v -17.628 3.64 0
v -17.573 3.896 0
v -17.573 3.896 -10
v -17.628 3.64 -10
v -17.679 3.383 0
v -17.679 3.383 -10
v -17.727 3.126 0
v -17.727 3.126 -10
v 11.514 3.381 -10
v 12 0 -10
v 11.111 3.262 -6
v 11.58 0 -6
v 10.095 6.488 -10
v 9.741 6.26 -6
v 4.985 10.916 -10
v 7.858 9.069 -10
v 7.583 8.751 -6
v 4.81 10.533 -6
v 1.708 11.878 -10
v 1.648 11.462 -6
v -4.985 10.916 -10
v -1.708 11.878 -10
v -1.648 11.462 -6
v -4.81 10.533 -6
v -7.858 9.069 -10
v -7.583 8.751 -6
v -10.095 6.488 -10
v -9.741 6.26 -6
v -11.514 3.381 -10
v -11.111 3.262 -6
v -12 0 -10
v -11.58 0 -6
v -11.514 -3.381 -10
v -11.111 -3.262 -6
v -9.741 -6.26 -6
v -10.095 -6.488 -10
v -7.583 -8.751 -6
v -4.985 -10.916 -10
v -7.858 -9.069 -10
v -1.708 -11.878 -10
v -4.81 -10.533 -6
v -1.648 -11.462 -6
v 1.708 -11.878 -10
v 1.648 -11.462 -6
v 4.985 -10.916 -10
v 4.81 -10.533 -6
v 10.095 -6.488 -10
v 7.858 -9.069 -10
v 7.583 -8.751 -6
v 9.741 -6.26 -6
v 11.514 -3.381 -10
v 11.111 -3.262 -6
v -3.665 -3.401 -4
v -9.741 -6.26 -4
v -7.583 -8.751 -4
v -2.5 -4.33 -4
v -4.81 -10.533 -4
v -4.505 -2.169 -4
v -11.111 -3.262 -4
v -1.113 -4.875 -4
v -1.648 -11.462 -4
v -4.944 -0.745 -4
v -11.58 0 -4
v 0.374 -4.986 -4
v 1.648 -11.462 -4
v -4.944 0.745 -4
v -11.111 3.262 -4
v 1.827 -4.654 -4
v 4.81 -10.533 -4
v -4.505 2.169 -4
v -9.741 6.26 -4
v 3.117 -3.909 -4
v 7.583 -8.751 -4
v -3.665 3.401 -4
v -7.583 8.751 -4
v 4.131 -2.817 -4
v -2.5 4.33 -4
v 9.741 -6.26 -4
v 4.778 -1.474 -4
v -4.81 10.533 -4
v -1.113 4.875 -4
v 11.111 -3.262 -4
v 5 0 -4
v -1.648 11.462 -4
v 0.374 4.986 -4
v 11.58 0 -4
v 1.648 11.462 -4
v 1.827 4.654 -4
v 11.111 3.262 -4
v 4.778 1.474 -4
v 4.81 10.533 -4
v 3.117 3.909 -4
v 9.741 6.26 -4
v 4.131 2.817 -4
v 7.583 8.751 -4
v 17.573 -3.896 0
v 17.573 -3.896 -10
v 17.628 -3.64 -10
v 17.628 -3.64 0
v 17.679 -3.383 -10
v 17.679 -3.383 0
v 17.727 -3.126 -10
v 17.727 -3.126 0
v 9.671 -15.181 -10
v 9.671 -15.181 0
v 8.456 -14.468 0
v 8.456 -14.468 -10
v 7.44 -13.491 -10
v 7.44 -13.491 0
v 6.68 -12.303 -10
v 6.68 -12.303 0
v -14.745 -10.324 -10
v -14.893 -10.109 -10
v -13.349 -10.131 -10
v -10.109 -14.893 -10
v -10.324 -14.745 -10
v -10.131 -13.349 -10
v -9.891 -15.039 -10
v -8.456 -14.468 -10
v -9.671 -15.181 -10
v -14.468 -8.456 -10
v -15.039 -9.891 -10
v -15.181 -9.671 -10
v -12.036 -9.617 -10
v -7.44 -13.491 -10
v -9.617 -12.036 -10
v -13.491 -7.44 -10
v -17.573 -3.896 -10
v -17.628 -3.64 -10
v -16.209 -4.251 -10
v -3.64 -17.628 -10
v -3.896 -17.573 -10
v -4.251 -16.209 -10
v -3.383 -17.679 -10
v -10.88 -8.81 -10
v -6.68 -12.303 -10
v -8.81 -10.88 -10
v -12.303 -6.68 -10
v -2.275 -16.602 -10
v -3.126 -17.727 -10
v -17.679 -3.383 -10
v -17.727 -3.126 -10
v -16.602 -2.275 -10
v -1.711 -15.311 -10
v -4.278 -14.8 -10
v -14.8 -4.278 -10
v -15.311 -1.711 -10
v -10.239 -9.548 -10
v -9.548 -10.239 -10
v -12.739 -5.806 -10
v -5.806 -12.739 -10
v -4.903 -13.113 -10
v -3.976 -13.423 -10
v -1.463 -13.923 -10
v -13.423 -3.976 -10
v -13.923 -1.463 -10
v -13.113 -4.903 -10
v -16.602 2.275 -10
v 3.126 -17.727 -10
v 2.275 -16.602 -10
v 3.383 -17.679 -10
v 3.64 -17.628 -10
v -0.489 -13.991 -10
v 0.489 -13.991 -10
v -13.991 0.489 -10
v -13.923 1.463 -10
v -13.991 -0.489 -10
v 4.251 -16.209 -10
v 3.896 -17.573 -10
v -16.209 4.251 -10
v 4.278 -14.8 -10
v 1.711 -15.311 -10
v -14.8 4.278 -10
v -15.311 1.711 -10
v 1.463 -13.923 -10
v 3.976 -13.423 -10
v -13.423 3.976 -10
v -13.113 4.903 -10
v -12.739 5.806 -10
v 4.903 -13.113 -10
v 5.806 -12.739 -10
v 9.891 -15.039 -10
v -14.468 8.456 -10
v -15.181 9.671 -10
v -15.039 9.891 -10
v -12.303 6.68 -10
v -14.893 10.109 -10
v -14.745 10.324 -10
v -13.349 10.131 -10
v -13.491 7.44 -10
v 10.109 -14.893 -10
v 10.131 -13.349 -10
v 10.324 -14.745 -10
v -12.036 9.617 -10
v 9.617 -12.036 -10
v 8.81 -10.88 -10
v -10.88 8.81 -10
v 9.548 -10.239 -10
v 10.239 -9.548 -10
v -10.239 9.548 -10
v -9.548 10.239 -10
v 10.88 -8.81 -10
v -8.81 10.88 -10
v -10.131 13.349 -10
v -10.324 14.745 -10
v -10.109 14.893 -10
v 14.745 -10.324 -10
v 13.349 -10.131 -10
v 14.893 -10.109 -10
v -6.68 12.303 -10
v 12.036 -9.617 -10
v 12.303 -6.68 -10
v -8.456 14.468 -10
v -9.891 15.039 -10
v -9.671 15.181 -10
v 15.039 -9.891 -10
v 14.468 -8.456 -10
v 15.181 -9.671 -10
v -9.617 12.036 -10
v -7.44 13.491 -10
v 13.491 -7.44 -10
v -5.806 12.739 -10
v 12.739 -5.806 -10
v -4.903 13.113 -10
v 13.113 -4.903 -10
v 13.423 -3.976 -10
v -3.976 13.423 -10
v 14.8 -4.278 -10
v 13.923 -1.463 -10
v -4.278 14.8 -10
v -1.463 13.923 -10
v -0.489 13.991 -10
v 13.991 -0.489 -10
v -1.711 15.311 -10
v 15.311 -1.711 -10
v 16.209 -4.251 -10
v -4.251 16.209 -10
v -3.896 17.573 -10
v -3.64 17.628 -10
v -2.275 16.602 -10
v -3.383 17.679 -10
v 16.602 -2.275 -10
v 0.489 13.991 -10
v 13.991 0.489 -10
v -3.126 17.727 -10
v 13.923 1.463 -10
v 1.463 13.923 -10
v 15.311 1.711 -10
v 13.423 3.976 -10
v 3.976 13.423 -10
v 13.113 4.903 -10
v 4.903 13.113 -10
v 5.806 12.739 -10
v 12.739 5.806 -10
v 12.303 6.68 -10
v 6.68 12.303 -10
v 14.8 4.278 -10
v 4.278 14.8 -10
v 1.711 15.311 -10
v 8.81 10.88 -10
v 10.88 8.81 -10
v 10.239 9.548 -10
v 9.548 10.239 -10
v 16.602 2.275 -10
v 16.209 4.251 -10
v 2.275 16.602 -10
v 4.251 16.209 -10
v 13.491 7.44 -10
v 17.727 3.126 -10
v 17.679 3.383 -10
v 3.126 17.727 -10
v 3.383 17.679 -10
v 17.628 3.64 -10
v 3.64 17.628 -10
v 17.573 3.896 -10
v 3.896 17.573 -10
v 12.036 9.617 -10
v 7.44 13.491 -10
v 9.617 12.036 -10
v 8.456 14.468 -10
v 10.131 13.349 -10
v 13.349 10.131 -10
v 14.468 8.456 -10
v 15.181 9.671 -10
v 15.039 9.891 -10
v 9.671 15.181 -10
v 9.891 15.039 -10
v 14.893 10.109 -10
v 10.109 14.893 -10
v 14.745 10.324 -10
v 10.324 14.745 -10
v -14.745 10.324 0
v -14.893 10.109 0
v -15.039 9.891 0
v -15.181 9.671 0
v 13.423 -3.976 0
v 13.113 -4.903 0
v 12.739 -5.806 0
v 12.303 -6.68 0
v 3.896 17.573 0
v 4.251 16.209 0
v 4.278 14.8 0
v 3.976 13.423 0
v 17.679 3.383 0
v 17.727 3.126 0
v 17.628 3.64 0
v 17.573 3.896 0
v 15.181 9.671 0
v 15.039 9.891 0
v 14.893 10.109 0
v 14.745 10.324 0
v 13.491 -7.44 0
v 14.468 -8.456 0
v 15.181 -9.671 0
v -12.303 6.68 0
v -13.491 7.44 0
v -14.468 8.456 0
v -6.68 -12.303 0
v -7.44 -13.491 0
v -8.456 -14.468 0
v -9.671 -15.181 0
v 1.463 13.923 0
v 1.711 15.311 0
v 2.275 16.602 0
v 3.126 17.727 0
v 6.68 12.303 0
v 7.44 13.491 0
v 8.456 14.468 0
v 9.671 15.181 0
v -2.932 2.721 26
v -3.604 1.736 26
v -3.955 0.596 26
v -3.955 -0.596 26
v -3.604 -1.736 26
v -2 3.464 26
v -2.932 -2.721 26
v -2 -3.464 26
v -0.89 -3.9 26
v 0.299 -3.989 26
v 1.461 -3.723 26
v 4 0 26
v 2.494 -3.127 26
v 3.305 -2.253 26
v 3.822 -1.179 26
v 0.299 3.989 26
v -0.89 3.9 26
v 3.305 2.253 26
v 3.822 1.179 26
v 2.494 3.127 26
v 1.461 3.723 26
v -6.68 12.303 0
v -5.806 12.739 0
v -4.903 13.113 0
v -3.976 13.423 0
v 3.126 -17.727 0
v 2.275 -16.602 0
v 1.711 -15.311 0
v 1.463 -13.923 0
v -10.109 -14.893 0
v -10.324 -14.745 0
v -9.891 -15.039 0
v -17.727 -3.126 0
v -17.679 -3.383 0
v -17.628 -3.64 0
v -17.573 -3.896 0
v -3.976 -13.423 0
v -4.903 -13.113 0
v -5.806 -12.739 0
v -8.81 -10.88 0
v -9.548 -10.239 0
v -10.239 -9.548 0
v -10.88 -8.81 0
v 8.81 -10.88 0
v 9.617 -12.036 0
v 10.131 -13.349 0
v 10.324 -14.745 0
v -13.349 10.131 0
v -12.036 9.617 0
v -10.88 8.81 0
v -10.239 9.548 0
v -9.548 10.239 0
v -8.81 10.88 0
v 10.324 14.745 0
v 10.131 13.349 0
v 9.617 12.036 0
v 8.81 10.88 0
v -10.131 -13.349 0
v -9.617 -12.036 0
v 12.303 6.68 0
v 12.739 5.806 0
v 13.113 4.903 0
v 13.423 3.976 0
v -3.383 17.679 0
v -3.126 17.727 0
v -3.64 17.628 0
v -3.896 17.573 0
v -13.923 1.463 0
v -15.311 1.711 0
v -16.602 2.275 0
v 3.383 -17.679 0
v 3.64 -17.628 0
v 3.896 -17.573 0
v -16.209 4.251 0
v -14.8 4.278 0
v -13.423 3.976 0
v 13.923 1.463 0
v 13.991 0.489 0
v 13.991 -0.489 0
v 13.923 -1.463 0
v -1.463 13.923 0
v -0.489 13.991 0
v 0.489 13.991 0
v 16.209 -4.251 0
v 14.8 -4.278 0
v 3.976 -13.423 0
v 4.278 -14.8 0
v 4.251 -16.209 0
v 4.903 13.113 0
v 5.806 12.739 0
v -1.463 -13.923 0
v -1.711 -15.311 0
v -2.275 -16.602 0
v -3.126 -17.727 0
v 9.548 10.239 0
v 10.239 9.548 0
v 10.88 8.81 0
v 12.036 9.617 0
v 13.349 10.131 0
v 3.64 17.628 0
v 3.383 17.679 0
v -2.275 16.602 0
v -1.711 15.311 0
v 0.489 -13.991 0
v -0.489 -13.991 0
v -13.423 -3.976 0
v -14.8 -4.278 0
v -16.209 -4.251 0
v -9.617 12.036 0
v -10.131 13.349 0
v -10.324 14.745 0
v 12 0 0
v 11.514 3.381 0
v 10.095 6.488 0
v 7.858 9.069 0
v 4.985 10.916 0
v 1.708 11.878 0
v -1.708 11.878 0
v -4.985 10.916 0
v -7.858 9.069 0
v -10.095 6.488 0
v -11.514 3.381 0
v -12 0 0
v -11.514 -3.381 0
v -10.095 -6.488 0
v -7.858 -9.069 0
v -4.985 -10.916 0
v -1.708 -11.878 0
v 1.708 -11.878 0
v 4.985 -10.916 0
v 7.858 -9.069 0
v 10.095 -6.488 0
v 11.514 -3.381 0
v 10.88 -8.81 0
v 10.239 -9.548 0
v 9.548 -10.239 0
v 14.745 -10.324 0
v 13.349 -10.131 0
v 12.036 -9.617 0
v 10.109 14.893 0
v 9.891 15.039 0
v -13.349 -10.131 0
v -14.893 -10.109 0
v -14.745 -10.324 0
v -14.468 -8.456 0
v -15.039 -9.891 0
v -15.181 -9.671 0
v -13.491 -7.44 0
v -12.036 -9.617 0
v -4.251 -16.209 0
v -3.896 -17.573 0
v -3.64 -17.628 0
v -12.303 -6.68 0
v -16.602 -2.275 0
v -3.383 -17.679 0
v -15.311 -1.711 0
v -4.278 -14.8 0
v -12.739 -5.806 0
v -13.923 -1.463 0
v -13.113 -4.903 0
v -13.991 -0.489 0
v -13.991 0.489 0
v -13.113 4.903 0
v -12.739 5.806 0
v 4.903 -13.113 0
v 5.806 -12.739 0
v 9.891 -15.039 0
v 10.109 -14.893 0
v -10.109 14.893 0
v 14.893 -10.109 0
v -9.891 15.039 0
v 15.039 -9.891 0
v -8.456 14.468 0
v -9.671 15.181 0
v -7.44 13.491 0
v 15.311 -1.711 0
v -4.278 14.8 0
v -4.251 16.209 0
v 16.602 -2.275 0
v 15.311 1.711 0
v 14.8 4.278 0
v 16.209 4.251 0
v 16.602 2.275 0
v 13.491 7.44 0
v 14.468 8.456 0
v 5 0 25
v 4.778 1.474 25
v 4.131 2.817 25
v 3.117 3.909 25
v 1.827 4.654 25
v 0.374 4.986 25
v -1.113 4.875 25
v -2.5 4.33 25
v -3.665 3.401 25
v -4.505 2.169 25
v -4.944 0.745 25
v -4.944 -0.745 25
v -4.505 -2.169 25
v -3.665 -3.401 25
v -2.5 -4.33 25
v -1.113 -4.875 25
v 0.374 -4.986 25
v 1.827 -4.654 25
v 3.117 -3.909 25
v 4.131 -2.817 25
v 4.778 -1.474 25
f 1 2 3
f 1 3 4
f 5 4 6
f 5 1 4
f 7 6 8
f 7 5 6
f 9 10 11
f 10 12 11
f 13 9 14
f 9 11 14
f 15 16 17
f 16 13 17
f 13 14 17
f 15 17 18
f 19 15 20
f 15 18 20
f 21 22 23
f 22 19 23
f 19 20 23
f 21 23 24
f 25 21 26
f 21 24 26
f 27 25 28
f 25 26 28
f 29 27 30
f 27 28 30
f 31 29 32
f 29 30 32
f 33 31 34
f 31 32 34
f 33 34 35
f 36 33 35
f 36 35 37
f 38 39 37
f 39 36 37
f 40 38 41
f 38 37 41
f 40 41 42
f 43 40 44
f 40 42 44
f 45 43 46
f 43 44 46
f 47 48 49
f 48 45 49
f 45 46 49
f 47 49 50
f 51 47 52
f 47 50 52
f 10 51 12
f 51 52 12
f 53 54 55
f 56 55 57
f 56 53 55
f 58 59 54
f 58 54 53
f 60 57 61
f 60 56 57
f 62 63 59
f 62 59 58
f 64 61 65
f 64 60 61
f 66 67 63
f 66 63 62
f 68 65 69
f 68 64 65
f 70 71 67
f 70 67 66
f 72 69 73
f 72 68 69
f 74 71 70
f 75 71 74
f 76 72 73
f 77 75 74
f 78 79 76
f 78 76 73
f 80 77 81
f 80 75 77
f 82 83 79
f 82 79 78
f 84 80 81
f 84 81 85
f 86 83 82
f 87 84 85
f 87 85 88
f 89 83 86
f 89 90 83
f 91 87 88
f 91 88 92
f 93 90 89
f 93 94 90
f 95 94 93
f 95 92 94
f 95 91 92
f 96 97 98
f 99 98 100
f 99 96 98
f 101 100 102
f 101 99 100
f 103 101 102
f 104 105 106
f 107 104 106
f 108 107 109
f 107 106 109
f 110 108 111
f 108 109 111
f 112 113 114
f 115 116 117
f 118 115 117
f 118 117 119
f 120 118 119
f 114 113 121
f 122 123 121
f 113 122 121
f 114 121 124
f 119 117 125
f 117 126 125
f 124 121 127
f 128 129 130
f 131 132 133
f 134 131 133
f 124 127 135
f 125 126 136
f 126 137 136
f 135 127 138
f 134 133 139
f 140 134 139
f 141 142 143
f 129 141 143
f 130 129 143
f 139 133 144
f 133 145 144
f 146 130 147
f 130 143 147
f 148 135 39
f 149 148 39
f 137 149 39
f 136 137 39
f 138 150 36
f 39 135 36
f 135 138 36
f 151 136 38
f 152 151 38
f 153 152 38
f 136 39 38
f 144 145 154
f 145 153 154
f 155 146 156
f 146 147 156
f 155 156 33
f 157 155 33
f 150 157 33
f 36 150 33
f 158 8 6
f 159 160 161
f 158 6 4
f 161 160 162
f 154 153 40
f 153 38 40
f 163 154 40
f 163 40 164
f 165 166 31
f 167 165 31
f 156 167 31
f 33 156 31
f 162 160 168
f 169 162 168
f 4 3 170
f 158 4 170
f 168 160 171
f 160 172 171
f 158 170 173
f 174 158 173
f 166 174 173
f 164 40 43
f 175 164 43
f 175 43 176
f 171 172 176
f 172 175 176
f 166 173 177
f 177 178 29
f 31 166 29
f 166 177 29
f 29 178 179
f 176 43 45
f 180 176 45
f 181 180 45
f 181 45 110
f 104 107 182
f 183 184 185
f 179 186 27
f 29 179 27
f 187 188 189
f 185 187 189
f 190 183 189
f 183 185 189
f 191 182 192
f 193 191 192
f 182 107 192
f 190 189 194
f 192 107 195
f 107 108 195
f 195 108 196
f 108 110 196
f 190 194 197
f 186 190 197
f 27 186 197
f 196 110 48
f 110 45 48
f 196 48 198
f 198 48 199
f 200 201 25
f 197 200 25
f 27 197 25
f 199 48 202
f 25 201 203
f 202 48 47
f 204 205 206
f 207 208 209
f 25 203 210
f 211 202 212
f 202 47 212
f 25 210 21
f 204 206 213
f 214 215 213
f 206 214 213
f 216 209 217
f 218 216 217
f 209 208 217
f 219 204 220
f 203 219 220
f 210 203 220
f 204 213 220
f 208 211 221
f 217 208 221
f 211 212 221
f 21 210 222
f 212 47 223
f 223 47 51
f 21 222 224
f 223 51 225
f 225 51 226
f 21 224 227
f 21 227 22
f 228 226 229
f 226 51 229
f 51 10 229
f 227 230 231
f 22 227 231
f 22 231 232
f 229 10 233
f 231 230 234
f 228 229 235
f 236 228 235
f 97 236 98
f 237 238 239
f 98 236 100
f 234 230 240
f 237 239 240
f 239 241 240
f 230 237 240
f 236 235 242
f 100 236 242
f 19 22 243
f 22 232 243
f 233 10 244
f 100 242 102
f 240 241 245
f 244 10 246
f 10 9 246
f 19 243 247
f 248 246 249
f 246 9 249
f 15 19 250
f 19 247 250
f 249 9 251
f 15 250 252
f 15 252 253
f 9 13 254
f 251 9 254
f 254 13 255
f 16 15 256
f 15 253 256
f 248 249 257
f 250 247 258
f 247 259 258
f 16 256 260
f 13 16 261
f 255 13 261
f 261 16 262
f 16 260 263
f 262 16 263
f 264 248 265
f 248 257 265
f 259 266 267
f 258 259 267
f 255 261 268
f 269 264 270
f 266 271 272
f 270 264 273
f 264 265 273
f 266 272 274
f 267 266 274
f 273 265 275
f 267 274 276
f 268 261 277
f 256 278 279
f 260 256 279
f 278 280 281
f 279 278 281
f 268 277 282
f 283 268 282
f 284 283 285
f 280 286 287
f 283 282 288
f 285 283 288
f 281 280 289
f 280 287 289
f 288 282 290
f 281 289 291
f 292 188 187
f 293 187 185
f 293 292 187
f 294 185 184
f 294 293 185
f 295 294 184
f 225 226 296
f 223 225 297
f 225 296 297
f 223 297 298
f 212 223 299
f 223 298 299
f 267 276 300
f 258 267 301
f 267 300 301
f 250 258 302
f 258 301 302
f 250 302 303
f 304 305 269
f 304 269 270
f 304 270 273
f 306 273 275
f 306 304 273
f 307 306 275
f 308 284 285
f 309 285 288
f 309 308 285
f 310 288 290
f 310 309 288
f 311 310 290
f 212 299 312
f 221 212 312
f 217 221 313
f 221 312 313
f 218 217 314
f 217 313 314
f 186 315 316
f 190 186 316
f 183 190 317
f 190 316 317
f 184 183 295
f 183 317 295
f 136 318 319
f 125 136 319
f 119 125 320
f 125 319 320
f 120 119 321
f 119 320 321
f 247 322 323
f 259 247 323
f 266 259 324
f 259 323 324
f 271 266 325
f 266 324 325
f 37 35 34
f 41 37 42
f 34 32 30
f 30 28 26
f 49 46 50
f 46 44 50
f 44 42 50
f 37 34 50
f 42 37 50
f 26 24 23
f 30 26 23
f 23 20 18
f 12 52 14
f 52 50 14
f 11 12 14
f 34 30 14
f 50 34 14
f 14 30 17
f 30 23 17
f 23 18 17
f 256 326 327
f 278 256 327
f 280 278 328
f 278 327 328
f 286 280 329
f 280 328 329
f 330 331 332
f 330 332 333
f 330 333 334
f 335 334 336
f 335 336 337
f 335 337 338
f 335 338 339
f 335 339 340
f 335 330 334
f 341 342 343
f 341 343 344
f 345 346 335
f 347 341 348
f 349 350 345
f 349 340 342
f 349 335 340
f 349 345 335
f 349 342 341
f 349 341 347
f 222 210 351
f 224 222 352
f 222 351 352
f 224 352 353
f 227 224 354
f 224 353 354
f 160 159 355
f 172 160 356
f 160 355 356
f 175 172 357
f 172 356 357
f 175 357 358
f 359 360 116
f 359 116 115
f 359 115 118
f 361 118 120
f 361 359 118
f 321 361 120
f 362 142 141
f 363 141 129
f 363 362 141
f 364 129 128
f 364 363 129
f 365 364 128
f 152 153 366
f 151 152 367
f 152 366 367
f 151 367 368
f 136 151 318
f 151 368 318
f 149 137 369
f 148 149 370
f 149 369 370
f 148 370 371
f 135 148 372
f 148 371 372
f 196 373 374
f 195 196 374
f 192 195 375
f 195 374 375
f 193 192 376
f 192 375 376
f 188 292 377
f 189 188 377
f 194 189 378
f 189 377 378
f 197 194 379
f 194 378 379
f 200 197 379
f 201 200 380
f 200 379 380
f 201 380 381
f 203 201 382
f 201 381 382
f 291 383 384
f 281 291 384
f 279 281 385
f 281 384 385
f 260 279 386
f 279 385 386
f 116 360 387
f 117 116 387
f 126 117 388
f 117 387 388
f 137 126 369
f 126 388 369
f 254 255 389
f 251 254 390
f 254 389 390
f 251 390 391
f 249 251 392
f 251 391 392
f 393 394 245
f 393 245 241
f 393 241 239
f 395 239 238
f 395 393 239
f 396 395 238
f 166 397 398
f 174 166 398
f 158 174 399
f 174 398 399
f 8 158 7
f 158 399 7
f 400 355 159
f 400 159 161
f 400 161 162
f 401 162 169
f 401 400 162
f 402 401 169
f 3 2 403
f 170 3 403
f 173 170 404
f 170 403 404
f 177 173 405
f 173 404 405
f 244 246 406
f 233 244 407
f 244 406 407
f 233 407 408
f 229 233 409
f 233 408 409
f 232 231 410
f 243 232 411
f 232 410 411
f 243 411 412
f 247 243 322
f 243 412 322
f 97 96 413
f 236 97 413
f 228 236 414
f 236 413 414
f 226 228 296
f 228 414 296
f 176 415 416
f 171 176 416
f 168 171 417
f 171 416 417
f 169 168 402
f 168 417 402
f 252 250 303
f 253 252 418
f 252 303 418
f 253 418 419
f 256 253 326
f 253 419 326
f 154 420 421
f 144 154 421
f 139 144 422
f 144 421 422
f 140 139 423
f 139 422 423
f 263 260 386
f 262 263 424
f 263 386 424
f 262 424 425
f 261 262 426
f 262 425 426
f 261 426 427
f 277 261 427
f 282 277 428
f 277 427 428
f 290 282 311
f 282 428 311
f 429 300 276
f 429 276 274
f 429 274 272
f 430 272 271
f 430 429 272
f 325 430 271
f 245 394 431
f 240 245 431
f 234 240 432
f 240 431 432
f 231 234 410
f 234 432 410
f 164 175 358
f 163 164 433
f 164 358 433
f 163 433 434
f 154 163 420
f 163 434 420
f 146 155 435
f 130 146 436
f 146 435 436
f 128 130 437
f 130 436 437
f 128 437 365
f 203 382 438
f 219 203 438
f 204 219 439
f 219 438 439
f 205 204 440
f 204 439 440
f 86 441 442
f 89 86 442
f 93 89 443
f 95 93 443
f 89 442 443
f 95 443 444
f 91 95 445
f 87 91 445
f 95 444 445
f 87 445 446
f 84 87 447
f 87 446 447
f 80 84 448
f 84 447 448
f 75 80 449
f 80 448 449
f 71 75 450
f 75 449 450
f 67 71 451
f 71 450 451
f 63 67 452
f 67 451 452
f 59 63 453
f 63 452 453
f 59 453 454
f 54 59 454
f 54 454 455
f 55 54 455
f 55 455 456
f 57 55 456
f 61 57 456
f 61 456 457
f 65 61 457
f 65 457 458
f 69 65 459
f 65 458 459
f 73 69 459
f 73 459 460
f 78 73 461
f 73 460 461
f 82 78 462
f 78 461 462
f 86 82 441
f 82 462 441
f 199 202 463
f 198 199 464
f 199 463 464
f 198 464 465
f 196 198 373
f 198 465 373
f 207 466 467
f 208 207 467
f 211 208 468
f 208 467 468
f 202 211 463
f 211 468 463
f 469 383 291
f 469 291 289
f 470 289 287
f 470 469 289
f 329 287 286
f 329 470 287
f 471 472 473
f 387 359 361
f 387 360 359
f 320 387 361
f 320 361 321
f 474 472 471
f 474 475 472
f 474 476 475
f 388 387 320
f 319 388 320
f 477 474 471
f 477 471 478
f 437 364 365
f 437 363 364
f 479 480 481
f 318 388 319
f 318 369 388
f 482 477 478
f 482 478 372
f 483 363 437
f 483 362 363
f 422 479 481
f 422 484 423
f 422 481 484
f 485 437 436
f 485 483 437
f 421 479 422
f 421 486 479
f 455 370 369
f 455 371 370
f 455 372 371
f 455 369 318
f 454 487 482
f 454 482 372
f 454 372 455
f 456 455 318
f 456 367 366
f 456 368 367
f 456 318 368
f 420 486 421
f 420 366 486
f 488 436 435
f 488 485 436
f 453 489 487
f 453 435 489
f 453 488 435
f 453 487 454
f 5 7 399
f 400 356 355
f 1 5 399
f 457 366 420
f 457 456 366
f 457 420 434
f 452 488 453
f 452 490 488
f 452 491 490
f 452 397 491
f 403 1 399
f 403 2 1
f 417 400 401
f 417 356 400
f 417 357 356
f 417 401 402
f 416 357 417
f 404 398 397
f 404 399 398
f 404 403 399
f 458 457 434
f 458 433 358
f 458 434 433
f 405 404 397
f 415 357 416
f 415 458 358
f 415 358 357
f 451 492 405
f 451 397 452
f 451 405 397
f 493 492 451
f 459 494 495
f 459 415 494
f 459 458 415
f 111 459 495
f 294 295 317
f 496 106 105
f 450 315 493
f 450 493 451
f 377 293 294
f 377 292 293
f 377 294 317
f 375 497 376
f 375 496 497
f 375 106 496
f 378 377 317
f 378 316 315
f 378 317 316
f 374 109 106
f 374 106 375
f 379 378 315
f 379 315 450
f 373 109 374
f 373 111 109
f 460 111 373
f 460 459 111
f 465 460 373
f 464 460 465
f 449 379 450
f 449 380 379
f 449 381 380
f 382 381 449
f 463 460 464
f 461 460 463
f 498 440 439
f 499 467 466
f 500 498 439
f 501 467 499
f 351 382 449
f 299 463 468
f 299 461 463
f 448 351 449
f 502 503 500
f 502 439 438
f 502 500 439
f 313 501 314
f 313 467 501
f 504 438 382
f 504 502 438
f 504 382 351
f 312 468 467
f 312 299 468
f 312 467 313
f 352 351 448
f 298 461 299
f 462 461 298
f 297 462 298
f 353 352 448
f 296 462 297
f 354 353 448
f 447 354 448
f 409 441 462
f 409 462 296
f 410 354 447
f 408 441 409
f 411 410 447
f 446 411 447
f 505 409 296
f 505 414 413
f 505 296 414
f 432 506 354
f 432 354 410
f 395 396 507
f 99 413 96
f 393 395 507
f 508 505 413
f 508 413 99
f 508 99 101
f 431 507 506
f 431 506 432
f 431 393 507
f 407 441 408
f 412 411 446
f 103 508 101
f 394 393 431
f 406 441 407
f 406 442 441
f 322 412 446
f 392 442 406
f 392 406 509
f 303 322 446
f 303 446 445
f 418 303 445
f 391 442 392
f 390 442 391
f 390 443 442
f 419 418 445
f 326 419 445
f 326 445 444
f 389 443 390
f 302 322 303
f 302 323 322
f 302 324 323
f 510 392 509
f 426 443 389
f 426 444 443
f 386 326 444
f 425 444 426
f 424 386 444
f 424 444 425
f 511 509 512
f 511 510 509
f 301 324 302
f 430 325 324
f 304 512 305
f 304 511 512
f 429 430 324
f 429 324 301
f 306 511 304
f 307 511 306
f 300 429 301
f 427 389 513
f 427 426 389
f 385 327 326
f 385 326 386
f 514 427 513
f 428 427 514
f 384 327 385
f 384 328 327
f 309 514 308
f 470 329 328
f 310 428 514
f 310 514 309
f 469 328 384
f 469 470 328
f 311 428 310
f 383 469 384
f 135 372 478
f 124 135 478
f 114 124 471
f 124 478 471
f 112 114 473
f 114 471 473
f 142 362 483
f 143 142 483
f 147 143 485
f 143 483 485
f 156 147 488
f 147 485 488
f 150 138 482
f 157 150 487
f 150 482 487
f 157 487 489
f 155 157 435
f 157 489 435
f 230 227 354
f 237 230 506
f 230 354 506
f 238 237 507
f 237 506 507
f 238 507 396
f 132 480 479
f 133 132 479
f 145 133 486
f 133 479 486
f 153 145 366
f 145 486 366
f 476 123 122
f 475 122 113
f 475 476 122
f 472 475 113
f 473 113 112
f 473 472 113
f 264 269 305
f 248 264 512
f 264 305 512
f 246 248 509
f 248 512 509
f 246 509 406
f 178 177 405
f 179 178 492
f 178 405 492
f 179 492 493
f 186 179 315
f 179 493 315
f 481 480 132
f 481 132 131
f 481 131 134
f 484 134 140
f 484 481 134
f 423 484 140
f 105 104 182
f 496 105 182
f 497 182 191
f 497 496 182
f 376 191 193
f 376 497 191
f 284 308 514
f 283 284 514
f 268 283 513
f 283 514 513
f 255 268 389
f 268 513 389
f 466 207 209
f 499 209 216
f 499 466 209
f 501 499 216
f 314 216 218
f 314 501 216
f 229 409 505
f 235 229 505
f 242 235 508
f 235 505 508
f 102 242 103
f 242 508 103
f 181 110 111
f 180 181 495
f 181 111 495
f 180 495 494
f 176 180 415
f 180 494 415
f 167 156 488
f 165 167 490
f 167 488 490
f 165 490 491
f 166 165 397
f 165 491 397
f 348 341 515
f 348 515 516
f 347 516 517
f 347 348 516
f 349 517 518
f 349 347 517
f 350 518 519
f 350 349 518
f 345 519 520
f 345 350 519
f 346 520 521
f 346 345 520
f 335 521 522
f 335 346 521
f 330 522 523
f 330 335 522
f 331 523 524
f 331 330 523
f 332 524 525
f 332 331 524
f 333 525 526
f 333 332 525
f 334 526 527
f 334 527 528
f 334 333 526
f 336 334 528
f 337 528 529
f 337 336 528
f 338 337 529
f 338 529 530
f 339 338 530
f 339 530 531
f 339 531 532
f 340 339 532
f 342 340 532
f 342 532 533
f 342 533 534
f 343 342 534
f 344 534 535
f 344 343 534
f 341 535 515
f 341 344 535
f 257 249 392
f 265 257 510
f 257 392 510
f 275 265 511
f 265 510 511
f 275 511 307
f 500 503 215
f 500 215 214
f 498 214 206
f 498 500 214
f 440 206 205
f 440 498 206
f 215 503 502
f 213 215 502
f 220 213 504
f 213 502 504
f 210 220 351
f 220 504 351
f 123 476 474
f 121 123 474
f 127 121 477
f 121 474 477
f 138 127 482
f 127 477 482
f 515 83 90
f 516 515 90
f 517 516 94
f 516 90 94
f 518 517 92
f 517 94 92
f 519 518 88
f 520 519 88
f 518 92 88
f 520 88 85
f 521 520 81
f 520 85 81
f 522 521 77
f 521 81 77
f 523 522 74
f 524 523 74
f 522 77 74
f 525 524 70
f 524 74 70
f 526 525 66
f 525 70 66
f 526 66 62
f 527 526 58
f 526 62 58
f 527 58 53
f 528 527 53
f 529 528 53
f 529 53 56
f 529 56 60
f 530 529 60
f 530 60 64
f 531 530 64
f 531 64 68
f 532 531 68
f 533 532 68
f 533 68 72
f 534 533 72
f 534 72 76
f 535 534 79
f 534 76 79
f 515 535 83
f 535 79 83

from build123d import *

# Parameters (mm, degrees)
SKETCH_1_R               = 18
EXTRUDE_1_DEPTH          = 10
CUT_EXTRUDE_1_DEPTH      = 28.349588662
PATTERN_CIRCULAR_1_COUNT = 16
SKETCH_3_R               = 12
CUT_EXTRUDE_2_DEPTH      = 4
CUT_EXTRUDE_2_DRAFT      = -6
CUT_EXTRUDE_START        = -10
SKETCH_3_2_R             = 12
CUT_EXTRUDE_3_DEPTH      = 4
CUT_EXTRUDE_3_TAPER      = 6
SKETCH_5_R               = 5
EXTRUDE_2_DEPTH          = 30
CHAMFER_1_SIZE           = 1


with BuildPart() as part:
    # Эскиз1 → Бобышка-Вытянуть1 (new body)
    with BuildSketch(Plane.XY):
        Circle(SKETCH_1_R)
    extrude(amount=-EXTRUDE_1_DEPTH)

    # Эскиз2 → Вырез-Вытянуть1 (cut, through all)
    with BuildSketch(Plane.XY):
        with BuildLine():
            ThreePointArc((3.125667198, 17.726539554), (0, 18), (-3.125667198, 17.726539554))
            ThreePointArc((-3.125667198, 17.726539554), (-1.955189123, 15.973239081), (-1.463398486, 13.923306535))
            ThreePointArc((-1.463398486, 13.923306535), (0, 14), (1.463398486, 13.923306535))
            ThreePointArc((1.463398486, 13.923306535), (1.955189123, 15.973239081), (3.125667198, 17.726539554))
        make_face()
    cut_extrude_1 = extrude(amount=-CUT_EXTRUDE_1_DEPTH, mode=Mode.SUBTRACT)

    # Круговой массив1: Вырез-Вытянуть1 ×16 about axis
    pattern_circular_1_axis = Axis((0, 0, 0), (0, 0, 1))
    for i in range(1, PATTERN_CIRCULAR_1_COUNT):
        add(cut_extrude_1.rotate(pattern_circular_1_axis, i * 360 / PATTERN_CIRCULAR_1_COUNT), mode=Mode.SUBTRACT)


with BuildPart() as cut_extrude_2_tool:
    # Эскиз3 → Вырез-Вытянуть2 (with draft: the straight prism first)
    with BuildSketch(Plane.XY):
        Circle(SKETCH_3_R)
    extrude(amount=-CUT_EXTRUDE_2_DEPTH)
    # Вырез-Вытянуть2: the draft: its side faces are tilted about the plane it starts from
    cut_extrude_2_sides = [cut_extrude_2_tool.faces().sort_by_distance(p)[0] for p in [
        (-12, 0, -2),
    ]]
    draft(cut_extrude_2_sides, Plane.XY, CUT_EXTRUDE_2_DRAFT)


with BuildPart() as part_1:
    add(part.part)

    # Вырез-Вытянуть2: cut by cut_extrude_2_tool
    add(cut_extrude_2_tool.part, mode=Mode.SUBTRACT)

    # Эскиз3<2> → Вырез-Вытянуть3 (cut)
    with BuildSketch(Plane.XY.offset(CUT_EXTRUDE_START)):
        Circle(SKETCH_3_2_R)
    extrude(amount=CUT_EXTRUDE_3_DEPTH, taper=CUT_EXTRUDE_3_TAPER, mode=Mode.SUBTRACT)

    # Эскиз5 → Бобышка-Вытянуть2 (add)
    with BuildSketch(Plane.XY.offset(-4)):
        Circle(SKETCH_5_R)
    extrude(amount=EXTRUDE_2_DEPTH)

    # Фаска1
    chamfer_1_edges = [part_1.edges().sort_by_distance(p)[0] for p in [
        (-5, 0, 26),
    ]]
    chamfer(chamfer_1_edges, length=CHAMFER_1_SIZE)


solid = part_1.part
